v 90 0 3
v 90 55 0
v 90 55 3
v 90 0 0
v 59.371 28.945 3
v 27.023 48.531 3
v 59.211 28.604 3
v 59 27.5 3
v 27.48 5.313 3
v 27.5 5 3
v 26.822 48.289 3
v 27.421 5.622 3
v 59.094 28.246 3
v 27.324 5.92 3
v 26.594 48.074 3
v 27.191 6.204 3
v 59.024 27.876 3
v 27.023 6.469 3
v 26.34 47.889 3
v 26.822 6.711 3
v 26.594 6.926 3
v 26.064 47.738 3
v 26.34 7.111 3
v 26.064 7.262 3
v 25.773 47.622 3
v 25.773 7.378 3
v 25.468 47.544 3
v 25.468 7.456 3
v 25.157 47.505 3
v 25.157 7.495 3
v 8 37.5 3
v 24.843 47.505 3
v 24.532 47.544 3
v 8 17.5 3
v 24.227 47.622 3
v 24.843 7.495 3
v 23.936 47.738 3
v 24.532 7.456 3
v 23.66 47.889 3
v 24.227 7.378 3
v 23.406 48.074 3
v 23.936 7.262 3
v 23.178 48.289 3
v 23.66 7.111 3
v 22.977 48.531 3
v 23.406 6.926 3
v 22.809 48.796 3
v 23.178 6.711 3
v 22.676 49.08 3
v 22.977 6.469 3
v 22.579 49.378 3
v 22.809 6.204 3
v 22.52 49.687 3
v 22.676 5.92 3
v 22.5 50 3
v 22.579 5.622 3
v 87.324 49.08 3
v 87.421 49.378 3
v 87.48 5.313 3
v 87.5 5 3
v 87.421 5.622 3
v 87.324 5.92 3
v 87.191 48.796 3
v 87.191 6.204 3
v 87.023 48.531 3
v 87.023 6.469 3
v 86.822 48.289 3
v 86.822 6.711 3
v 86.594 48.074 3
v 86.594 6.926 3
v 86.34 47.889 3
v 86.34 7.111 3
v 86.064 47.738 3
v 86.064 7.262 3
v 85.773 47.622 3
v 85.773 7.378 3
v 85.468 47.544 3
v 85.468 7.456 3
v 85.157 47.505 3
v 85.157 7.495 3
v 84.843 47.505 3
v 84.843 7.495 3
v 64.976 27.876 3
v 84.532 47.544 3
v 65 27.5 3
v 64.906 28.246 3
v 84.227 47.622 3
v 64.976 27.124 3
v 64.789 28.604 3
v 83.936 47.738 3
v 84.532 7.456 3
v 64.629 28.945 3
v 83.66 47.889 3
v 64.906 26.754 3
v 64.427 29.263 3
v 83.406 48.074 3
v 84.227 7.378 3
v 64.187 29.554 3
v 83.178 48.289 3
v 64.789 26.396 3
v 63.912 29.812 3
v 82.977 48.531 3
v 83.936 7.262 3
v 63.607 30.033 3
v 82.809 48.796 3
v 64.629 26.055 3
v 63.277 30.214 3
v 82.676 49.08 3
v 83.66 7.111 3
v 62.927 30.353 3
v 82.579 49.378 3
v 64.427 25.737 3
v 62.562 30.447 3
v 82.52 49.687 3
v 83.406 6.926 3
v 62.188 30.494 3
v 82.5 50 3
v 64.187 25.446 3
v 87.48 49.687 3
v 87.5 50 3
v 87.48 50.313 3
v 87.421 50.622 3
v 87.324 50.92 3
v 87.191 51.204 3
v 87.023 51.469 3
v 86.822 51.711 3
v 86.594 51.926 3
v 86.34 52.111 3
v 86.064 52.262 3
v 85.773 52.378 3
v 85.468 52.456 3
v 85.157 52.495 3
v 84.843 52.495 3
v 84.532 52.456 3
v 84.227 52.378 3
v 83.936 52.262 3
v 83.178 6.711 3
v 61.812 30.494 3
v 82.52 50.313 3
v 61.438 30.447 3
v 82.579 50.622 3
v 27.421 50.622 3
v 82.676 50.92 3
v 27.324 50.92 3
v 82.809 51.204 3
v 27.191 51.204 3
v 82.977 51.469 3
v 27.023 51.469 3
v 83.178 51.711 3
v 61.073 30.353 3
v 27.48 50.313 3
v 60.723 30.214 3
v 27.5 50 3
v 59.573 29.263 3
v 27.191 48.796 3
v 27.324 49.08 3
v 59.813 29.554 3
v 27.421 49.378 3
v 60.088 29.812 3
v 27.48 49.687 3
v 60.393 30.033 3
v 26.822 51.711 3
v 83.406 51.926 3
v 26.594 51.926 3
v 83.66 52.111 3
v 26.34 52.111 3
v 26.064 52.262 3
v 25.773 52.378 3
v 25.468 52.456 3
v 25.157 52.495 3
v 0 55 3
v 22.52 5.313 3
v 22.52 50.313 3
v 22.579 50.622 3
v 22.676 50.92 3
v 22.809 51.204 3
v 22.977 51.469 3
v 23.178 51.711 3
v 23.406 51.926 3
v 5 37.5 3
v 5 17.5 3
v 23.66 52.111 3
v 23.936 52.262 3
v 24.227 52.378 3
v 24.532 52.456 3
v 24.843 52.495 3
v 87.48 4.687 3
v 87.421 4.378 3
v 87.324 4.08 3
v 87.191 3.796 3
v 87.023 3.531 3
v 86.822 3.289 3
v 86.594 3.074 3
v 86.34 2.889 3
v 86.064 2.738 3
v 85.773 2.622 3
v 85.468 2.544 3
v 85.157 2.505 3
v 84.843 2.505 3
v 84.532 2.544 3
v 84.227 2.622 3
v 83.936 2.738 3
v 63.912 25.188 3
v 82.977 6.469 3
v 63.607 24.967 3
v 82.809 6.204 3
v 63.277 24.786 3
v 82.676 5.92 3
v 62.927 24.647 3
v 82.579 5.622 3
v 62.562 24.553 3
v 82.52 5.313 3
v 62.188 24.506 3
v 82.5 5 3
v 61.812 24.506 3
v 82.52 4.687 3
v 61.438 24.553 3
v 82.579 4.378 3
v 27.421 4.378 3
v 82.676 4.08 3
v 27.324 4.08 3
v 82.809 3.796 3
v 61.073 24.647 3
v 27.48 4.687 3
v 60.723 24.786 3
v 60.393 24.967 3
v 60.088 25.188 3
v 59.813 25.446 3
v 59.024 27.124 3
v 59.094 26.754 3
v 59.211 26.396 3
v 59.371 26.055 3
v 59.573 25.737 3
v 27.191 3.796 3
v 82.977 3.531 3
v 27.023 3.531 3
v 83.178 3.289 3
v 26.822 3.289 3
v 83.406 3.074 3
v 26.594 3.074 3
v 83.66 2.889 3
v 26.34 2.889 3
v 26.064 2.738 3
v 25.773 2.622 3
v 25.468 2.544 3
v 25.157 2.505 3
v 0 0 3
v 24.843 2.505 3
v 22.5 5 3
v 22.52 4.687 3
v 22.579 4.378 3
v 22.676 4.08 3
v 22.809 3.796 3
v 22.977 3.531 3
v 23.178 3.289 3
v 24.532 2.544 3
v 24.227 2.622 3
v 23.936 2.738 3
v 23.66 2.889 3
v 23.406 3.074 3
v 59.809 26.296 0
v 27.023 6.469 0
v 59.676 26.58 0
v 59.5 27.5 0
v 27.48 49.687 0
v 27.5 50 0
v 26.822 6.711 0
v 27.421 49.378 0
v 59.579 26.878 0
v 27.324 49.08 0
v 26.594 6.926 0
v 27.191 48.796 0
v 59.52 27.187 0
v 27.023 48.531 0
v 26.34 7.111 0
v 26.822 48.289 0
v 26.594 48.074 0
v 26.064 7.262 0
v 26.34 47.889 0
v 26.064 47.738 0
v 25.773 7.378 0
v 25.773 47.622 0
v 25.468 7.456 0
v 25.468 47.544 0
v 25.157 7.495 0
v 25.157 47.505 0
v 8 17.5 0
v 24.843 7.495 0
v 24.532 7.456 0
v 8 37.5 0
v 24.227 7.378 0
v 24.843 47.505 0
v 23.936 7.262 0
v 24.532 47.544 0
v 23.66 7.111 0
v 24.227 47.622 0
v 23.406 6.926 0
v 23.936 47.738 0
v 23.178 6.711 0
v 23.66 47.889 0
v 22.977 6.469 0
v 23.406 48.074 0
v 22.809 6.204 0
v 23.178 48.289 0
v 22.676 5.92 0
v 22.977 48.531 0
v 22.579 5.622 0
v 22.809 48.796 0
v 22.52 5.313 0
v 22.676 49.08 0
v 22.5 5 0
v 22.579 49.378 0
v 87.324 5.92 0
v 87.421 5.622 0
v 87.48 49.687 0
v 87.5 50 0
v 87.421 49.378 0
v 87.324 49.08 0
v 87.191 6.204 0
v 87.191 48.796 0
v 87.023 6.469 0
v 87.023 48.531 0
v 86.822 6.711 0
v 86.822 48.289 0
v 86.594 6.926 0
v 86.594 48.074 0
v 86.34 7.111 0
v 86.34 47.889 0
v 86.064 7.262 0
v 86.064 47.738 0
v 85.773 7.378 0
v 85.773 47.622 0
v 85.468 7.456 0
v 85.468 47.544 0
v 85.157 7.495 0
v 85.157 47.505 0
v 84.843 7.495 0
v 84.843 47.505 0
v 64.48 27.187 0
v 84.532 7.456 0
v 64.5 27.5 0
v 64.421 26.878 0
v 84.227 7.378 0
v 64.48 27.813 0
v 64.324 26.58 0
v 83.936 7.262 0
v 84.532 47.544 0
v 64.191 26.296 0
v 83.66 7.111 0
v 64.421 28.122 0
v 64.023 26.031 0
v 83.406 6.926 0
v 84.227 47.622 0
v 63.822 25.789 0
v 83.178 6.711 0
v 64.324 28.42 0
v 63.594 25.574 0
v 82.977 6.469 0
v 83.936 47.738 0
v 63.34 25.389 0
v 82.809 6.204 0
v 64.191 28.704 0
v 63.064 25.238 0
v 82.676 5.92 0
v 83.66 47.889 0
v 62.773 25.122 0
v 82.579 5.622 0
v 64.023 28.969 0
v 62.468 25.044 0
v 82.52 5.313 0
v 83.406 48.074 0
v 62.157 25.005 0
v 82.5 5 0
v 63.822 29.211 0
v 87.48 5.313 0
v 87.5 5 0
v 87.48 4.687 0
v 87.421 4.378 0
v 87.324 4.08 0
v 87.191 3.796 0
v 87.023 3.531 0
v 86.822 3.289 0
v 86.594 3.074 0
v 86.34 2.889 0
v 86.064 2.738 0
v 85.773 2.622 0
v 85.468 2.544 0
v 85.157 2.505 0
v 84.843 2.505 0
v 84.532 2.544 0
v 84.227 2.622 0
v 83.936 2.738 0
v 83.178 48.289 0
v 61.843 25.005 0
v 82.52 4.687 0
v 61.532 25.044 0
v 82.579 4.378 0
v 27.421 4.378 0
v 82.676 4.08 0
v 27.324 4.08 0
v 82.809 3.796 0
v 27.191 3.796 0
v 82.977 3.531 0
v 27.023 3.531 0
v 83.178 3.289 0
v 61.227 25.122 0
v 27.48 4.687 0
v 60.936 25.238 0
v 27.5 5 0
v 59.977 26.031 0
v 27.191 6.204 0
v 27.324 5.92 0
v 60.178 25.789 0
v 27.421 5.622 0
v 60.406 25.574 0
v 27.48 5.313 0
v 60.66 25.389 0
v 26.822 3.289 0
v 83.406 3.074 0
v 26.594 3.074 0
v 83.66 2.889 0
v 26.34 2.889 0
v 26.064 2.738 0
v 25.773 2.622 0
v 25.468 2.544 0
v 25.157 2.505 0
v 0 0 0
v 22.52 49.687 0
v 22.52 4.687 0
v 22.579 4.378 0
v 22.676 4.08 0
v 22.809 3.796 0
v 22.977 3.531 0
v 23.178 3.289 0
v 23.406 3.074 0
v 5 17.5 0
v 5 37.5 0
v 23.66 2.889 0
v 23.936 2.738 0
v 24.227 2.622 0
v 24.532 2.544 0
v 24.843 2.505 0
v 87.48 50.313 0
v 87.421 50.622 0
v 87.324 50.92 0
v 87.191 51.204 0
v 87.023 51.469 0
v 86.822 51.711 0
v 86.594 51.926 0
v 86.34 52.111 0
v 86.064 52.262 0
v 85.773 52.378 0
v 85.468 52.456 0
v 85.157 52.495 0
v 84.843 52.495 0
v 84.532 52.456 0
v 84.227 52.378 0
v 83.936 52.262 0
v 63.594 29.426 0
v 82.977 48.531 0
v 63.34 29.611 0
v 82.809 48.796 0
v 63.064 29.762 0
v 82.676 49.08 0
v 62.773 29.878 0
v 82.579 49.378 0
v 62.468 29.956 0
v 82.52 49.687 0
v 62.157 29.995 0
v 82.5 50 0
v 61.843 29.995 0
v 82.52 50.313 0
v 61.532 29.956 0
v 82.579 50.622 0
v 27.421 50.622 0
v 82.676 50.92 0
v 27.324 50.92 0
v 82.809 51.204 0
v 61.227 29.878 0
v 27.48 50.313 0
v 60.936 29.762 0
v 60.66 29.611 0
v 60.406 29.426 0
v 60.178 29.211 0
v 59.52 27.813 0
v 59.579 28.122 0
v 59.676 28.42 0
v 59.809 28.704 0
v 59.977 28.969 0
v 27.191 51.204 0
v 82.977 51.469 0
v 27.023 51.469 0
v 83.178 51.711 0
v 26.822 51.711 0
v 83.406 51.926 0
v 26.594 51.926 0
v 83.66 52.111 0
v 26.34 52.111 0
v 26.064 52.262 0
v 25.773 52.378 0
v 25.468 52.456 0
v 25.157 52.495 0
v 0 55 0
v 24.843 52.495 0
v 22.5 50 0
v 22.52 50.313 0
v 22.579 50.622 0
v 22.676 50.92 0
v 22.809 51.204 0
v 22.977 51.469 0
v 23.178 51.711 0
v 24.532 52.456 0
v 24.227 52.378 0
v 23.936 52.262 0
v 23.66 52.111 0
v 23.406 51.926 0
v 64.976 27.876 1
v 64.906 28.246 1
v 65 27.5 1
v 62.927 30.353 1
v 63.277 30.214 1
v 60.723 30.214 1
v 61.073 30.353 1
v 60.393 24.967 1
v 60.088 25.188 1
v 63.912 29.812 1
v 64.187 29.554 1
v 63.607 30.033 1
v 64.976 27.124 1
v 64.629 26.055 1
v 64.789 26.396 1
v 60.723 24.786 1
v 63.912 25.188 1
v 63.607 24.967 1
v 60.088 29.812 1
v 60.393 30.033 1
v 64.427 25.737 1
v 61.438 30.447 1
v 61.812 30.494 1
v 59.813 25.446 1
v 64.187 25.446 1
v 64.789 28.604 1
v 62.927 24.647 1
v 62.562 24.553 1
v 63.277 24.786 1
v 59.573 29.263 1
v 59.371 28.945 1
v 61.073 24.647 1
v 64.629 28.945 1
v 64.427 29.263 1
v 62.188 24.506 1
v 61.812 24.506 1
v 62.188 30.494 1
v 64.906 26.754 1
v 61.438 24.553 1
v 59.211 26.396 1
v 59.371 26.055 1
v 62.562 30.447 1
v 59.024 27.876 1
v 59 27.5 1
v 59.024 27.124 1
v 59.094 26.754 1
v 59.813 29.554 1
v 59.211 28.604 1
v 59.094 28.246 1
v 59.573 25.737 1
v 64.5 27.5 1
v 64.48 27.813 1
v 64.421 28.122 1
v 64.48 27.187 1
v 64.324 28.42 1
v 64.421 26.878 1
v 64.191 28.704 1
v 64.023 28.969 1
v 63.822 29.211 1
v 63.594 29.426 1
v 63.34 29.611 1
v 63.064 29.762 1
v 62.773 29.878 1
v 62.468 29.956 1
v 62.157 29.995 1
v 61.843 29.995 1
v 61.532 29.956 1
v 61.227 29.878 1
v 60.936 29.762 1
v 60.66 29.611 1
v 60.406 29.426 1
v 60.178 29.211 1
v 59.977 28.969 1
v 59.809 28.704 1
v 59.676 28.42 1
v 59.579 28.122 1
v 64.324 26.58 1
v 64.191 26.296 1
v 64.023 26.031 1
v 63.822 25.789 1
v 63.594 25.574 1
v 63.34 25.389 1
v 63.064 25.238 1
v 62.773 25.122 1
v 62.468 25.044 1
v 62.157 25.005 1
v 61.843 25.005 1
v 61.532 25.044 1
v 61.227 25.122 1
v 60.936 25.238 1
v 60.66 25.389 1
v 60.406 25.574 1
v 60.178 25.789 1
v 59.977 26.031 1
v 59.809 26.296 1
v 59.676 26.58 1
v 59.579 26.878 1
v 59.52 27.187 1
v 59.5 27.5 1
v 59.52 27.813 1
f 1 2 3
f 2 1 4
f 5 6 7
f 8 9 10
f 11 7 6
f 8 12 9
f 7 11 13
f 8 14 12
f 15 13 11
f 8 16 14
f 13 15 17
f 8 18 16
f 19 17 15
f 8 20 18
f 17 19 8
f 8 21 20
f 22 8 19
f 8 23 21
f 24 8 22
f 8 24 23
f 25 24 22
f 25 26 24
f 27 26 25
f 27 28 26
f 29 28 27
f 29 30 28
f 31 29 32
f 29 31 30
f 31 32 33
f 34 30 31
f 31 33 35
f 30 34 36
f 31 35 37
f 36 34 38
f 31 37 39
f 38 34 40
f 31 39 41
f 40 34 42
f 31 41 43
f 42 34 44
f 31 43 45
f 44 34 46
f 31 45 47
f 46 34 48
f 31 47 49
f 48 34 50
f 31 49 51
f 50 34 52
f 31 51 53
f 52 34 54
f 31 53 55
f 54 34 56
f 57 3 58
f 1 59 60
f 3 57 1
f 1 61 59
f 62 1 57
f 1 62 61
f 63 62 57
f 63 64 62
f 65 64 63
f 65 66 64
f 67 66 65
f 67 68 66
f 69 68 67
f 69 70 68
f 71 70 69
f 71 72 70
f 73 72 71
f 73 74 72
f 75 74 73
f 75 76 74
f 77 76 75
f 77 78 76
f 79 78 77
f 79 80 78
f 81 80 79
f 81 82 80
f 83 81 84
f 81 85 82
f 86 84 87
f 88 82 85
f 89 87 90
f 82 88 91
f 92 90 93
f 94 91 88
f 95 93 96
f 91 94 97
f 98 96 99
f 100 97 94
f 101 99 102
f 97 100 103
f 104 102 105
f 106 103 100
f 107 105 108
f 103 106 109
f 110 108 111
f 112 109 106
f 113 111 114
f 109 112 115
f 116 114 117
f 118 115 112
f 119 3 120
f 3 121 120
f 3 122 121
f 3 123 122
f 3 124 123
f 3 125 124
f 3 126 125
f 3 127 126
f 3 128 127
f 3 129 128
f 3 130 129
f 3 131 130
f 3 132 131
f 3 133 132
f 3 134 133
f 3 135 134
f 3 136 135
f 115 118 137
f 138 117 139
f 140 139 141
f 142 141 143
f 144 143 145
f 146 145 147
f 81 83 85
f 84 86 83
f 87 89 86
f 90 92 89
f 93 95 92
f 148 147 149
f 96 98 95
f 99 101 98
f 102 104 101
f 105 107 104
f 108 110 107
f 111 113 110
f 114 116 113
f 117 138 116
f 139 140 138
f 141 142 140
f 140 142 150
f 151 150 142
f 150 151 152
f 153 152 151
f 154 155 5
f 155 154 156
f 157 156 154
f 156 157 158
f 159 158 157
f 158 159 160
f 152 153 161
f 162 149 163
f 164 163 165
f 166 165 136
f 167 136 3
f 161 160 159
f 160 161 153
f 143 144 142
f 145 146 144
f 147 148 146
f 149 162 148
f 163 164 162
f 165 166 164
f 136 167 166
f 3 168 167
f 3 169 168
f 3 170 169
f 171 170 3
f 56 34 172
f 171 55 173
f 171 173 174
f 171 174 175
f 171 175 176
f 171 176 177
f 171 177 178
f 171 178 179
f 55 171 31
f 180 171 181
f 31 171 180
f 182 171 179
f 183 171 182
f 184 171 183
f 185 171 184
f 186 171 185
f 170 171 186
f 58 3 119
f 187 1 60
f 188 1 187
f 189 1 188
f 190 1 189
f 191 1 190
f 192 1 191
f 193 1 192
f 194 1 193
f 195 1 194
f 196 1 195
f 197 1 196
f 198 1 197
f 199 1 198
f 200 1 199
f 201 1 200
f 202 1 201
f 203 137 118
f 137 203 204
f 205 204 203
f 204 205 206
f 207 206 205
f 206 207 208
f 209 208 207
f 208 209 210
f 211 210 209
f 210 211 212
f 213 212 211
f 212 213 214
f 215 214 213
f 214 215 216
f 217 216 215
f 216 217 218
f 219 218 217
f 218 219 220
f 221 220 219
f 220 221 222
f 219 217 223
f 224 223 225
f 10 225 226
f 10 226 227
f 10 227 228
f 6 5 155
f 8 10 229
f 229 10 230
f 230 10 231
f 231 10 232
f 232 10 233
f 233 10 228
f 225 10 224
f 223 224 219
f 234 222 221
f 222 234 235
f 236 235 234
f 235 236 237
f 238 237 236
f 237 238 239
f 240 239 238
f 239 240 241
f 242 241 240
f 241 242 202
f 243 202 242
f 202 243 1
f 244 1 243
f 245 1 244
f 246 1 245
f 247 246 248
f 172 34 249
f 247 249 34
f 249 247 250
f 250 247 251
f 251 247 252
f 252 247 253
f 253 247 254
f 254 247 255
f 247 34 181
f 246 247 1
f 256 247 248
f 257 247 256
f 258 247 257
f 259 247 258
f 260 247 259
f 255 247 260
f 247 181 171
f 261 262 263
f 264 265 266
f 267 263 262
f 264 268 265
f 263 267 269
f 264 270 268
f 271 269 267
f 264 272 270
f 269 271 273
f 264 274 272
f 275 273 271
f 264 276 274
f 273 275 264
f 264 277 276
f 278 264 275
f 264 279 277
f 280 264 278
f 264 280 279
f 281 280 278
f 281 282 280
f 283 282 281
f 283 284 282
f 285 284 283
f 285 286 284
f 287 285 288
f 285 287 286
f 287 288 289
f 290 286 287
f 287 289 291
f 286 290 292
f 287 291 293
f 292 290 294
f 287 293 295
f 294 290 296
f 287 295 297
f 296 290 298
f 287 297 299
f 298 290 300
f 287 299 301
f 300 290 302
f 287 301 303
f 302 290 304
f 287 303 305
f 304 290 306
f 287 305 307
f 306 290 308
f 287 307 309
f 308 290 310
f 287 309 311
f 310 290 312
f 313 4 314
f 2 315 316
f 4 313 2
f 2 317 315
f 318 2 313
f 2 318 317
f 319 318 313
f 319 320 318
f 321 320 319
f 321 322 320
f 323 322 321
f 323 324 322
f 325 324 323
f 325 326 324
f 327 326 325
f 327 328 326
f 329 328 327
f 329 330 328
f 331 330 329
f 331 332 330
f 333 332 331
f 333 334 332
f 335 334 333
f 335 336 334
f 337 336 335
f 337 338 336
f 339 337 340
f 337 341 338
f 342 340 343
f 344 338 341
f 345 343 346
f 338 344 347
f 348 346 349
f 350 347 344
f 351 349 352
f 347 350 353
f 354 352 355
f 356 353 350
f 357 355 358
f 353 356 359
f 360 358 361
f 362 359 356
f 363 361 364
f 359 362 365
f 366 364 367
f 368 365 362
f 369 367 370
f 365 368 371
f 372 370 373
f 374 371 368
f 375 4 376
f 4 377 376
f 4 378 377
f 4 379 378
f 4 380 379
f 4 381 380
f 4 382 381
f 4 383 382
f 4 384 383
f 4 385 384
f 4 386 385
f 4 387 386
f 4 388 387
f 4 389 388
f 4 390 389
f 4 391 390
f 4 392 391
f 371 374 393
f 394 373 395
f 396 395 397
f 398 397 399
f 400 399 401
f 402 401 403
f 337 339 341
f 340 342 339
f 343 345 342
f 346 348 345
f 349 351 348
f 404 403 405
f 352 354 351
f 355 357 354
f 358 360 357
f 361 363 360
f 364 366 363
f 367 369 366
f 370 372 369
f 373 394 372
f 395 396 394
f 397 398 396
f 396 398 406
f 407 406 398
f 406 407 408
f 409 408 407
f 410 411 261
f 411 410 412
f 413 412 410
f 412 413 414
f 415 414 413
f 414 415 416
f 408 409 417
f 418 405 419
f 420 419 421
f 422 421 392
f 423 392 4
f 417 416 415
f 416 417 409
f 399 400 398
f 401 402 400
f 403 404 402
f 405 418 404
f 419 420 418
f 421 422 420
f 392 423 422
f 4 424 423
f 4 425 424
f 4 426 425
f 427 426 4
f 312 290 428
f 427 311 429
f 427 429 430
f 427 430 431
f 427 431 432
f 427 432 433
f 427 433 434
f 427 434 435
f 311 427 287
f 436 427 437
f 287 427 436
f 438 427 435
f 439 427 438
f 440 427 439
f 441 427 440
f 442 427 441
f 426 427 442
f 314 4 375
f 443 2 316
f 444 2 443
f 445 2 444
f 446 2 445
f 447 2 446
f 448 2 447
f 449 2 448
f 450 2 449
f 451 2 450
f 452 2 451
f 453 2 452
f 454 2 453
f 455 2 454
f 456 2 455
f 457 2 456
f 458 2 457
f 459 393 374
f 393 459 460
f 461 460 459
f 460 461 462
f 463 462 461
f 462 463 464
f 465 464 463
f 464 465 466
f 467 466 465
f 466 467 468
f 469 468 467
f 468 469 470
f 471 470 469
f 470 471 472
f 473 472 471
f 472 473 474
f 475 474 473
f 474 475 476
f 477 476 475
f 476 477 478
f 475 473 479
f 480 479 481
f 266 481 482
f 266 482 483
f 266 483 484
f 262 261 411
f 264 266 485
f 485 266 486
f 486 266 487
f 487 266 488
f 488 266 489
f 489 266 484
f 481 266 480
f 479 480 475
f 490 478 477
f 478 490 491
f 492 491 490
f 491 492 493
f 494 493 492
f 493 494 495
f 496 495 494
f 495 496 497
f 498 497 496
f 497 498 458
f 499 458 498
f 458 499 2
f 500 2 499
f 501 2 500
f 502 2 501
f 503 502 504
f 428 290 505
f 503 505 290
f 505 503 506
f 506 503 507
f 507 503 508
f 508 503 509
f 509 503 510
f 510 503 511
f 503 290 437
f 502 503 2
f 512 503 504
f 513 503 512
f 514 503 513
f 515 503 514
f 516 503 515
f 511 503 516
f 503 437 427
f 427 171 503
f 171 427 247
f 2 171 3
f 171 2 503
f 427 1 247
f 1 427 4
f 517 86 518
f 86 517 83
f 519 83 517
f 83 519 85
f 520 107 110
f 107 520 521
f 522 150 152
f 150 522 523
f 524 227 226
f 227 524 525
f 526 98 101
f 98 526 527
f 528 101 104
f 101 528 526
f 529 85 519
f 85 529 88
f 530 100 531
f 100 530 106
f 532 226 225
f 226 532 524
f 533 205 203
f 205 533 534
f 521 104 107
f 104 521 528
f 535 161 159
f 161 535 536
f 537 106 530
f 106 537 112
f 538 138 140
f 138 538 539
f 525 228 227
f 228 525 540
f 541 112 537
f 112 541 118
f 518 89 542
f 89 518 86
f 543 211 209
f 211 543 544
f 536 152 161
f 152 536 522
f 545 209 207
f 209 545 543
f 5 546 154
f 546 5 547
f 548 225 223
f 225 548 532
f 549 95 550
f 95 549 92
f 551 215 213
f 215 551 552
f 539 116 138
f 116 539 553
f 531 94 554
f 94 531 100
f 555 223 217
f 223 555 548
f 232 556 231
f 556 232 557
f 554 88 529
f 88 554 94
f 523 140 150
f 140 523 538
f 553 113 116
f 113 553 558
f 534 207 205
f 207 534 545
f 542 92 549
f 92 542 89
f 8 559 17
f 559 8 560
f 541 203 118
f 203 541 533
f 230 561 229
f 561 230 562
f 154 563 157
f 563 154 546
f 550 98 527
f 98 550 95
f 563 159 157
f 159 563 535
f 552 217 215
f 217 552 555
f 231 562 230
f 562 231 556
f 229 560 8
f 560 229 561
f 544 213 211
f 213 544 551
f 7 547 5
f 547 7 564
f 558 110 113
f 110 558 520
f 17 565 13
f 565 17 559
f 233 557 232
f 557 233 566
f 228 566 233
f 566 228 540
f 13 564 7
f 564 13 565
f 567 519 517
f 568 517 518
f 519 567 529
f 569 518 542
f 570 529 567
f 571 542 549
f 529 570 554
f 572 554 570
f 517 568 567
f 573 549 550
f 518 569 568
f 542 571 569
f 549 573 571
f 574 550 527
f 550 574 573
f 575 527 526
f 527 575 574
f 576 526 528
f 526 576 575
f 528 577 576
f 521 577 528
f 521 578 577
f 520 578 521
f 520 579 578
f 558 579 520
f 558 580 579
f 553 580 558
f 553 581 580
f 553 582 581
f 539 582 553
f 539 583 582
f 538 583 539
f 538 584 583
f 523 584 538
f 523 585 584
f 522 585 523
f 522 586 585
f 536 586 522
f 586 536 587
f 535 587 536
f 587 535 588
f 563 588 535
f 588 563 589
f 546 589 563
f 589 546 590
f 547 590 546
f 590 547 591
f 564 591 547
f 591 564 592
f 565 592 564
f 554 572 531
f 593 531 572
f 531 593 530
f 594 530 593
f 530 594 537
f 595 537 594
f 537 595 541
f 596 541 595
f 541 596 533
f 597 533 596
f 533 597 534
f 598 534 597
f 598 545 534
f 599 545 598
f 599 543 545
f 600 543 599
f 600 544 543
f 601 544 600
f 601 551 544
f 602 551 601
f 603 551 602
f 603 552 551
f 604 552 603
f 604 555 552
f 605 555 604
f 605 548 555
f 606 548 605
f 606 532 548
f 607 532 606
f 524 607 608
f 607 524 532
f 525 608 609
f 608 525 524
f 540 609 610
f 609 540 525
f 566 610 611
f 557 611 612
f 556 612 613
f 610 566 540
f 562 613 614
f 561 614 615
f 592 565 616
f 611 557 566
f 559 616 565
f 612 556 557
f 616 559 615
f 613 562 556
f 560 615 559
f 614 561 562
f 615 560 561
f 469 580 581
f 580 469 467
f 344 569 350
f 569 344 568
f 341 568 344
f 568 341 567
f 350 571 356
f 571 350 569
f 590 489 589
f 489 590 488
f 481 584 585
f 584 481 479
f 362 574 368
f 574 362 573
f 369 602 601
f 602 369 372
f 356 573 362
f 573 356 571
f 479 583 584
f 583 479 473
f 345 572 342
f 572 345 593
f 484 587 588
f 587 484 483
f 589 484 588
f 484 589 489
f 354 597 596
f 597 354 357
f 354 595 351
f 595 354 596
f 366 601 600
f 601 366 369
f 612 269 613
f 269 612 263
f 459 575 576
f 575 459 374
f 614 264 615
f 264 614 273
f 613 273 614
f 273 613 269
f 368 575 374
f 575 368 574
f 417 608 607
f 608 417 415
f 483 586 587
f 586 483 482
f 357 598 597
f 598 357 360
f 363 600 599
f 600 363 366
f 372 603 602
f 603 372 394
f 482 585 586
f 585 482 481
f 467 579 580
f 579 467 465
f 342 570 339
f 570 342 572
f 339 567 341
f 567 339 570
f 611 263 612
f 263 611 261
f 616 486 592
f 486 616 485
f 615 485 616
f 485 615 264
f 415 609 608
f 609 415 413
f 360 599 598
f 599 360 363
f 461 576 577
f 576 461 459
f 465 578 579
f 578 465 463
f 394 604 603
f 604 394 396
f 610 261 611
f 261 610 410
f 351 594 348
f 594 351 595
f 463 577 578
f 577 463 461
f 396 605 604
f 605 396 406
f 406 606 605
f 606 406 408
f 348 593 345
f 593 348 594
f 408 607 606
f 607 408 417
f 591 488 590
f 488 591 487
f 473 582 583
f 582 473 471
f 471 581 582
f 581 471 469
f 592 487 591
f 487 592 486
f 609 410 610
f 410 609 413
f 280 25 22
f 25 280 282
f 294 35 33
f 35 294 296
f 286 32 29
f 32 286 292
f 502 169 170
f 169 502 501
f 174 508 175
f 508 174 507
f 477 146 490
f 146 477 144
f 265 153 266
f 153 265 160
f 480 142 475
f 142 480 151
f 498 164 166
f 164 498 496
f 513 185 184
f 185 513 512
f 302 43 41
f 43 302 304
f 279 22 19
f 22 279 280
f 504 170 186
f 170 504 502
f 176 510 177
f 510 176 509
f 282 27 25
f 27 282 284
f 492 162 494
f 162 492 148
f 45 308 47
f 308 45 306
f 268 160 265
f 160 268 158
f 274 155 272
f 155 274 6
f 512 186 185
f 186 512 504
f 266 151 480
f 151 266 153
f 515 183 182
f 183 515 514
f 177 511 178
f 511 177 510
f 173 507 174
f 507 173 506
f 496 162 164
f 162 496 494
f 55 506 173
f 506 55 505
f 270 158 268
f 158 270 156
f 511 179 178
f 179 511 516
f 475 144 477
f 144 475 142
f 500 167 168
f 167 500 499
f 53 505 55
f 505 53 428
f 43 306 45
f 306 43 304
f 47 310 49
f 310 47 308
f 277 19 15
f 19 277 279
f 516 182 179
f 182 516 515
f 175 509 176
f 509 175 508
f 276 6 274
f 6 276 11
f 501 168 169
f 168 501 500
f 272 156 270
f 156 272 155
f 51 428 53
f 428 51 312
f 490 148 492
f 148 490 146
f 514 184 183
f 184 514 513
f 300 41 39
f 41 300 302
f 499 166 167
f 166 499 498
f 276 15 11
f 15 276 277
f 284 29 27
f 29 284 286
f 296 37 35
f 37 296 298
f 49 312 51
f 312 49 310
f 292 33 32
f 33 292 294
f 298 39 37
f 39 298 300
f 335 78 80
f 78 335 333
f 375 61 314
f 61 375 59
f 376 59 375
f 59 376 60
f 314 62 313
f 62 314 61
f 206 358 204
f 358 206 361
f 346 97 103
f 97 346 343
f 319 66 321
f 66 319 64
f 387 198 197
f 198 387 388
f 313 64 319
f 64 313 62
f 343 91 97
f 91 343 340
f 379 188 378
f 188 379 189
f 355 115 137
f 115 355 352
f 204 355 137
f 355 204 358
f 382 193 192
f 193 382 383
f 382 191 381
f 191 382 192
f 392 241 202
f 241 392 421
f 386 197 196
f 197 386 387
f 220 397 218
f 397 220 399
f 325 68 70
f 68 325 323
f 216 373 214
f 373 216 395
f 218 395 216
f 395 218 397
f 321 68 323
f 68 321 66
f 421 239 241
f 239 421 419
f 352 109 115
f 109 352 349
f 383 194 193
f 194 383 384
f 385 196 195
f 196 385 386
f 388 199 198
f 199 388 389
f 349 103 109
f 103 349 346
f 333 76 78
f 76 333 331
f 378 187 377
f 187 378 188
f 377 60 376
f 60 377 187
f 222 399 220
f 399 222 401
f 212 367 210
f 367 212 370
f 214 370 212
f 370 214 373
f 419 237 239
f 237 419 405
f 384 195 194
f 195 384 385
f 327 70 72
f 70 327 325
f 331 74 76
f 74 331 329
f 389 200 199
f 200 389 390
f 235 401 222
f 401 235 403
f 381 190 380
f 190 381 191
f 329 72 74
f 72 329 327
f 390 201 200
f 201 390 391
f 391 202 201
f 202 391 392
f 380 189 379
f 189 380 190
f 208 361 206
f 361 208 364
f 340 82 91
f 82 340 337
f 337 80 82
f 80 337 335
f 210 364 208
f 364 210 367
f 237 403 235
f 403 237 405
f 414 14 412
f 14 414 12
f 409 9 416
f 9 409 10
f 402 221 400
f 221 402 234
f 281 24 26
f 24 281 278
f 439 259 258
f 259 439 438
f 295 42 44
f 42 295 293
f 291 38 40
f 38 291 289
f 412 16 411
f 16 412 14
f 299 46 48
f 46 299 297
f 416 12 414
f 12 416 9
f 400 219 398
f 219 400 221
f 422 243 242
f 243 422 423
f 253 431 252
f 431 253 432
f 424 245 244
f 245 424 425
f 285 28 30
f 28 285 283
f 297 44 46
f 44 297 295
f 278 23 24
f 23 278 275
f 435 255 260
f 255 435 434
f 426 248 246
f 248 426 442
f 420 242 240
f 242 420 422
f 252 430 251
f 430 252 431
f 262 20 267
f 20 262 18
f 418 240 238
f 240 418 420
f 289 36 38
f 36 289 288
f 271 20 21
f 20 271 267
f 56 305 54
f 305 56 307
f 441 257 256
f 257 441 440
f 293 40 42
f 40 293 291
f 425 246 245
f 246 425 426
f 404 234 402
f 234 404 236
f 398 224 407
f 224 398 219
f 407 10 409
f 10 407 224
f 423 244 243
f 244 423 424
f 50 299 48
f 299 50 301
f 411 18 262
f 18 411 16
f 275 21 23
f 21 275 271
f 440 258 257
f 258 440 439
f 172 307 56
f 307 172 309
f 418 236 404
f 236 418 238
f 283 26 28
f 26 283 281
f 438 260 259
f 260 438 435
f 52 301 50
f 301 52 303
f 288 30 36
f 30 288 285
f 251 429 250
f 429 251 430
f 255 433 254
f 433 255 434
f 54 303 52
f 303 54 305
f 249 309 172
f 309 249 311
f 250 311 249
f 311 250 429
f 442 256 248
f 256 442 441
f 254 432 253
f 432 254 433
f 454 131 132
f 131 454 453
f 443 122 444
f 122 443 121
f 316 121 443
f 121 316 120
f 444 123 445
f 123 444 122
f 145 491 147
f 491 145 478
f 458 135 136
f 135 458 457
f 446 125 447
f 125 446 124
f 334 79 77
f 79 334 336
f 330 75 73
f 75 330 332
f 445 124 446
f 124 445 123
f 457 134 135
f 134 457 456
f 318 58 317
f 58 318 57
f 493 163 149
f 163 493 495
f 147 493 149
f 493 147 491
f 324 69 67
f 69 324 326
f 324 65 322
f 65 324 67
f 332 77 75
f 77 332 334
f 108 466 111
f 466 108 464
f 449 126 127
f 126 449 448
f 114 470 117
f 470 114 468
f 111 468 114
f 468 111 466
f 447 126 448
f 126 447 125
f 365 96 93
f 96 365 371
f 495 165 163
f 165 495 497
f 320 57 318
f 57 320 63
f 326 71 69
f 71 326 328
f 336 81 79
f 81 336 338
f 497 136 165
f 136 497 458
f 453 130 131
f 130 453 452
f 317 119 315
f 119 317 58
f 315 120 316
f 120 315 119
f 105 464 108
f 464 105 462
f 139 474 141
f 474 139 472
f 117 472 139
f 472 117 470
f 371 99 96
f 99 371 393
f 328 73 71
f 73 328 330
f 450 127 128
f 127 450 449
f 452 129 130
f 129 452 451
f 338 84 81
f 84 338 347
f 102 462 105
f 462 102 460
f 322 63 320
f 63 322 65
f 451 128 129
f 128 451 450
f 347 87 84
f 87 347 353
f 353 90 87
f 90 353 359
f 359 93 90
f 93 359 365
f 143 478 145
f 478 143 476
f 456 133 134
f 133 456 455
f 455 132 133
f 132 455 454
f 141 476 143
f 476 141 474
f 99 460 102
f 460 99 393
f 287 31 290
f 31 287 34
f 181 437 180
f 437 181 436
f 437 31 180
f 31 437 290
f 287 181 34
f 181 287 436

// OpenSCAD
// Pi camera
difference() {
    // Bottom 
    cube([90,55,3]);
    
    // camera lens top hole
    translate([62,27.5,1]) {
        color([1,0,0]) cylinder(h=3,r=3,
        $fn=50);
    }
    
     // camera lens bottom hole
    translate([62,27.5,0]) {
        color([0,1,0]) cylinder(h=1,r=2.5,
        $fn=50);
    }
   
    // Guide holes in each corner
    translate([25,50,-1]) cylinder(h=6, d=5,
    $fn=50);
    translate([85,5,-1]) cylinder(h=6, d=5,
    $fn=50);
    translate([25,5,-1]) cylinder(h=6, d=5,
    $fn=50);
    translate([85,50,-1]) cylinder(h=6, d=5,
    $fn=50);
    
    // Slot for Pi Camera ribbon cable
    translate([5, 17.5, -1]) {
        color([1,0,0])
        cube([3,20,5]);  
    }
 }
